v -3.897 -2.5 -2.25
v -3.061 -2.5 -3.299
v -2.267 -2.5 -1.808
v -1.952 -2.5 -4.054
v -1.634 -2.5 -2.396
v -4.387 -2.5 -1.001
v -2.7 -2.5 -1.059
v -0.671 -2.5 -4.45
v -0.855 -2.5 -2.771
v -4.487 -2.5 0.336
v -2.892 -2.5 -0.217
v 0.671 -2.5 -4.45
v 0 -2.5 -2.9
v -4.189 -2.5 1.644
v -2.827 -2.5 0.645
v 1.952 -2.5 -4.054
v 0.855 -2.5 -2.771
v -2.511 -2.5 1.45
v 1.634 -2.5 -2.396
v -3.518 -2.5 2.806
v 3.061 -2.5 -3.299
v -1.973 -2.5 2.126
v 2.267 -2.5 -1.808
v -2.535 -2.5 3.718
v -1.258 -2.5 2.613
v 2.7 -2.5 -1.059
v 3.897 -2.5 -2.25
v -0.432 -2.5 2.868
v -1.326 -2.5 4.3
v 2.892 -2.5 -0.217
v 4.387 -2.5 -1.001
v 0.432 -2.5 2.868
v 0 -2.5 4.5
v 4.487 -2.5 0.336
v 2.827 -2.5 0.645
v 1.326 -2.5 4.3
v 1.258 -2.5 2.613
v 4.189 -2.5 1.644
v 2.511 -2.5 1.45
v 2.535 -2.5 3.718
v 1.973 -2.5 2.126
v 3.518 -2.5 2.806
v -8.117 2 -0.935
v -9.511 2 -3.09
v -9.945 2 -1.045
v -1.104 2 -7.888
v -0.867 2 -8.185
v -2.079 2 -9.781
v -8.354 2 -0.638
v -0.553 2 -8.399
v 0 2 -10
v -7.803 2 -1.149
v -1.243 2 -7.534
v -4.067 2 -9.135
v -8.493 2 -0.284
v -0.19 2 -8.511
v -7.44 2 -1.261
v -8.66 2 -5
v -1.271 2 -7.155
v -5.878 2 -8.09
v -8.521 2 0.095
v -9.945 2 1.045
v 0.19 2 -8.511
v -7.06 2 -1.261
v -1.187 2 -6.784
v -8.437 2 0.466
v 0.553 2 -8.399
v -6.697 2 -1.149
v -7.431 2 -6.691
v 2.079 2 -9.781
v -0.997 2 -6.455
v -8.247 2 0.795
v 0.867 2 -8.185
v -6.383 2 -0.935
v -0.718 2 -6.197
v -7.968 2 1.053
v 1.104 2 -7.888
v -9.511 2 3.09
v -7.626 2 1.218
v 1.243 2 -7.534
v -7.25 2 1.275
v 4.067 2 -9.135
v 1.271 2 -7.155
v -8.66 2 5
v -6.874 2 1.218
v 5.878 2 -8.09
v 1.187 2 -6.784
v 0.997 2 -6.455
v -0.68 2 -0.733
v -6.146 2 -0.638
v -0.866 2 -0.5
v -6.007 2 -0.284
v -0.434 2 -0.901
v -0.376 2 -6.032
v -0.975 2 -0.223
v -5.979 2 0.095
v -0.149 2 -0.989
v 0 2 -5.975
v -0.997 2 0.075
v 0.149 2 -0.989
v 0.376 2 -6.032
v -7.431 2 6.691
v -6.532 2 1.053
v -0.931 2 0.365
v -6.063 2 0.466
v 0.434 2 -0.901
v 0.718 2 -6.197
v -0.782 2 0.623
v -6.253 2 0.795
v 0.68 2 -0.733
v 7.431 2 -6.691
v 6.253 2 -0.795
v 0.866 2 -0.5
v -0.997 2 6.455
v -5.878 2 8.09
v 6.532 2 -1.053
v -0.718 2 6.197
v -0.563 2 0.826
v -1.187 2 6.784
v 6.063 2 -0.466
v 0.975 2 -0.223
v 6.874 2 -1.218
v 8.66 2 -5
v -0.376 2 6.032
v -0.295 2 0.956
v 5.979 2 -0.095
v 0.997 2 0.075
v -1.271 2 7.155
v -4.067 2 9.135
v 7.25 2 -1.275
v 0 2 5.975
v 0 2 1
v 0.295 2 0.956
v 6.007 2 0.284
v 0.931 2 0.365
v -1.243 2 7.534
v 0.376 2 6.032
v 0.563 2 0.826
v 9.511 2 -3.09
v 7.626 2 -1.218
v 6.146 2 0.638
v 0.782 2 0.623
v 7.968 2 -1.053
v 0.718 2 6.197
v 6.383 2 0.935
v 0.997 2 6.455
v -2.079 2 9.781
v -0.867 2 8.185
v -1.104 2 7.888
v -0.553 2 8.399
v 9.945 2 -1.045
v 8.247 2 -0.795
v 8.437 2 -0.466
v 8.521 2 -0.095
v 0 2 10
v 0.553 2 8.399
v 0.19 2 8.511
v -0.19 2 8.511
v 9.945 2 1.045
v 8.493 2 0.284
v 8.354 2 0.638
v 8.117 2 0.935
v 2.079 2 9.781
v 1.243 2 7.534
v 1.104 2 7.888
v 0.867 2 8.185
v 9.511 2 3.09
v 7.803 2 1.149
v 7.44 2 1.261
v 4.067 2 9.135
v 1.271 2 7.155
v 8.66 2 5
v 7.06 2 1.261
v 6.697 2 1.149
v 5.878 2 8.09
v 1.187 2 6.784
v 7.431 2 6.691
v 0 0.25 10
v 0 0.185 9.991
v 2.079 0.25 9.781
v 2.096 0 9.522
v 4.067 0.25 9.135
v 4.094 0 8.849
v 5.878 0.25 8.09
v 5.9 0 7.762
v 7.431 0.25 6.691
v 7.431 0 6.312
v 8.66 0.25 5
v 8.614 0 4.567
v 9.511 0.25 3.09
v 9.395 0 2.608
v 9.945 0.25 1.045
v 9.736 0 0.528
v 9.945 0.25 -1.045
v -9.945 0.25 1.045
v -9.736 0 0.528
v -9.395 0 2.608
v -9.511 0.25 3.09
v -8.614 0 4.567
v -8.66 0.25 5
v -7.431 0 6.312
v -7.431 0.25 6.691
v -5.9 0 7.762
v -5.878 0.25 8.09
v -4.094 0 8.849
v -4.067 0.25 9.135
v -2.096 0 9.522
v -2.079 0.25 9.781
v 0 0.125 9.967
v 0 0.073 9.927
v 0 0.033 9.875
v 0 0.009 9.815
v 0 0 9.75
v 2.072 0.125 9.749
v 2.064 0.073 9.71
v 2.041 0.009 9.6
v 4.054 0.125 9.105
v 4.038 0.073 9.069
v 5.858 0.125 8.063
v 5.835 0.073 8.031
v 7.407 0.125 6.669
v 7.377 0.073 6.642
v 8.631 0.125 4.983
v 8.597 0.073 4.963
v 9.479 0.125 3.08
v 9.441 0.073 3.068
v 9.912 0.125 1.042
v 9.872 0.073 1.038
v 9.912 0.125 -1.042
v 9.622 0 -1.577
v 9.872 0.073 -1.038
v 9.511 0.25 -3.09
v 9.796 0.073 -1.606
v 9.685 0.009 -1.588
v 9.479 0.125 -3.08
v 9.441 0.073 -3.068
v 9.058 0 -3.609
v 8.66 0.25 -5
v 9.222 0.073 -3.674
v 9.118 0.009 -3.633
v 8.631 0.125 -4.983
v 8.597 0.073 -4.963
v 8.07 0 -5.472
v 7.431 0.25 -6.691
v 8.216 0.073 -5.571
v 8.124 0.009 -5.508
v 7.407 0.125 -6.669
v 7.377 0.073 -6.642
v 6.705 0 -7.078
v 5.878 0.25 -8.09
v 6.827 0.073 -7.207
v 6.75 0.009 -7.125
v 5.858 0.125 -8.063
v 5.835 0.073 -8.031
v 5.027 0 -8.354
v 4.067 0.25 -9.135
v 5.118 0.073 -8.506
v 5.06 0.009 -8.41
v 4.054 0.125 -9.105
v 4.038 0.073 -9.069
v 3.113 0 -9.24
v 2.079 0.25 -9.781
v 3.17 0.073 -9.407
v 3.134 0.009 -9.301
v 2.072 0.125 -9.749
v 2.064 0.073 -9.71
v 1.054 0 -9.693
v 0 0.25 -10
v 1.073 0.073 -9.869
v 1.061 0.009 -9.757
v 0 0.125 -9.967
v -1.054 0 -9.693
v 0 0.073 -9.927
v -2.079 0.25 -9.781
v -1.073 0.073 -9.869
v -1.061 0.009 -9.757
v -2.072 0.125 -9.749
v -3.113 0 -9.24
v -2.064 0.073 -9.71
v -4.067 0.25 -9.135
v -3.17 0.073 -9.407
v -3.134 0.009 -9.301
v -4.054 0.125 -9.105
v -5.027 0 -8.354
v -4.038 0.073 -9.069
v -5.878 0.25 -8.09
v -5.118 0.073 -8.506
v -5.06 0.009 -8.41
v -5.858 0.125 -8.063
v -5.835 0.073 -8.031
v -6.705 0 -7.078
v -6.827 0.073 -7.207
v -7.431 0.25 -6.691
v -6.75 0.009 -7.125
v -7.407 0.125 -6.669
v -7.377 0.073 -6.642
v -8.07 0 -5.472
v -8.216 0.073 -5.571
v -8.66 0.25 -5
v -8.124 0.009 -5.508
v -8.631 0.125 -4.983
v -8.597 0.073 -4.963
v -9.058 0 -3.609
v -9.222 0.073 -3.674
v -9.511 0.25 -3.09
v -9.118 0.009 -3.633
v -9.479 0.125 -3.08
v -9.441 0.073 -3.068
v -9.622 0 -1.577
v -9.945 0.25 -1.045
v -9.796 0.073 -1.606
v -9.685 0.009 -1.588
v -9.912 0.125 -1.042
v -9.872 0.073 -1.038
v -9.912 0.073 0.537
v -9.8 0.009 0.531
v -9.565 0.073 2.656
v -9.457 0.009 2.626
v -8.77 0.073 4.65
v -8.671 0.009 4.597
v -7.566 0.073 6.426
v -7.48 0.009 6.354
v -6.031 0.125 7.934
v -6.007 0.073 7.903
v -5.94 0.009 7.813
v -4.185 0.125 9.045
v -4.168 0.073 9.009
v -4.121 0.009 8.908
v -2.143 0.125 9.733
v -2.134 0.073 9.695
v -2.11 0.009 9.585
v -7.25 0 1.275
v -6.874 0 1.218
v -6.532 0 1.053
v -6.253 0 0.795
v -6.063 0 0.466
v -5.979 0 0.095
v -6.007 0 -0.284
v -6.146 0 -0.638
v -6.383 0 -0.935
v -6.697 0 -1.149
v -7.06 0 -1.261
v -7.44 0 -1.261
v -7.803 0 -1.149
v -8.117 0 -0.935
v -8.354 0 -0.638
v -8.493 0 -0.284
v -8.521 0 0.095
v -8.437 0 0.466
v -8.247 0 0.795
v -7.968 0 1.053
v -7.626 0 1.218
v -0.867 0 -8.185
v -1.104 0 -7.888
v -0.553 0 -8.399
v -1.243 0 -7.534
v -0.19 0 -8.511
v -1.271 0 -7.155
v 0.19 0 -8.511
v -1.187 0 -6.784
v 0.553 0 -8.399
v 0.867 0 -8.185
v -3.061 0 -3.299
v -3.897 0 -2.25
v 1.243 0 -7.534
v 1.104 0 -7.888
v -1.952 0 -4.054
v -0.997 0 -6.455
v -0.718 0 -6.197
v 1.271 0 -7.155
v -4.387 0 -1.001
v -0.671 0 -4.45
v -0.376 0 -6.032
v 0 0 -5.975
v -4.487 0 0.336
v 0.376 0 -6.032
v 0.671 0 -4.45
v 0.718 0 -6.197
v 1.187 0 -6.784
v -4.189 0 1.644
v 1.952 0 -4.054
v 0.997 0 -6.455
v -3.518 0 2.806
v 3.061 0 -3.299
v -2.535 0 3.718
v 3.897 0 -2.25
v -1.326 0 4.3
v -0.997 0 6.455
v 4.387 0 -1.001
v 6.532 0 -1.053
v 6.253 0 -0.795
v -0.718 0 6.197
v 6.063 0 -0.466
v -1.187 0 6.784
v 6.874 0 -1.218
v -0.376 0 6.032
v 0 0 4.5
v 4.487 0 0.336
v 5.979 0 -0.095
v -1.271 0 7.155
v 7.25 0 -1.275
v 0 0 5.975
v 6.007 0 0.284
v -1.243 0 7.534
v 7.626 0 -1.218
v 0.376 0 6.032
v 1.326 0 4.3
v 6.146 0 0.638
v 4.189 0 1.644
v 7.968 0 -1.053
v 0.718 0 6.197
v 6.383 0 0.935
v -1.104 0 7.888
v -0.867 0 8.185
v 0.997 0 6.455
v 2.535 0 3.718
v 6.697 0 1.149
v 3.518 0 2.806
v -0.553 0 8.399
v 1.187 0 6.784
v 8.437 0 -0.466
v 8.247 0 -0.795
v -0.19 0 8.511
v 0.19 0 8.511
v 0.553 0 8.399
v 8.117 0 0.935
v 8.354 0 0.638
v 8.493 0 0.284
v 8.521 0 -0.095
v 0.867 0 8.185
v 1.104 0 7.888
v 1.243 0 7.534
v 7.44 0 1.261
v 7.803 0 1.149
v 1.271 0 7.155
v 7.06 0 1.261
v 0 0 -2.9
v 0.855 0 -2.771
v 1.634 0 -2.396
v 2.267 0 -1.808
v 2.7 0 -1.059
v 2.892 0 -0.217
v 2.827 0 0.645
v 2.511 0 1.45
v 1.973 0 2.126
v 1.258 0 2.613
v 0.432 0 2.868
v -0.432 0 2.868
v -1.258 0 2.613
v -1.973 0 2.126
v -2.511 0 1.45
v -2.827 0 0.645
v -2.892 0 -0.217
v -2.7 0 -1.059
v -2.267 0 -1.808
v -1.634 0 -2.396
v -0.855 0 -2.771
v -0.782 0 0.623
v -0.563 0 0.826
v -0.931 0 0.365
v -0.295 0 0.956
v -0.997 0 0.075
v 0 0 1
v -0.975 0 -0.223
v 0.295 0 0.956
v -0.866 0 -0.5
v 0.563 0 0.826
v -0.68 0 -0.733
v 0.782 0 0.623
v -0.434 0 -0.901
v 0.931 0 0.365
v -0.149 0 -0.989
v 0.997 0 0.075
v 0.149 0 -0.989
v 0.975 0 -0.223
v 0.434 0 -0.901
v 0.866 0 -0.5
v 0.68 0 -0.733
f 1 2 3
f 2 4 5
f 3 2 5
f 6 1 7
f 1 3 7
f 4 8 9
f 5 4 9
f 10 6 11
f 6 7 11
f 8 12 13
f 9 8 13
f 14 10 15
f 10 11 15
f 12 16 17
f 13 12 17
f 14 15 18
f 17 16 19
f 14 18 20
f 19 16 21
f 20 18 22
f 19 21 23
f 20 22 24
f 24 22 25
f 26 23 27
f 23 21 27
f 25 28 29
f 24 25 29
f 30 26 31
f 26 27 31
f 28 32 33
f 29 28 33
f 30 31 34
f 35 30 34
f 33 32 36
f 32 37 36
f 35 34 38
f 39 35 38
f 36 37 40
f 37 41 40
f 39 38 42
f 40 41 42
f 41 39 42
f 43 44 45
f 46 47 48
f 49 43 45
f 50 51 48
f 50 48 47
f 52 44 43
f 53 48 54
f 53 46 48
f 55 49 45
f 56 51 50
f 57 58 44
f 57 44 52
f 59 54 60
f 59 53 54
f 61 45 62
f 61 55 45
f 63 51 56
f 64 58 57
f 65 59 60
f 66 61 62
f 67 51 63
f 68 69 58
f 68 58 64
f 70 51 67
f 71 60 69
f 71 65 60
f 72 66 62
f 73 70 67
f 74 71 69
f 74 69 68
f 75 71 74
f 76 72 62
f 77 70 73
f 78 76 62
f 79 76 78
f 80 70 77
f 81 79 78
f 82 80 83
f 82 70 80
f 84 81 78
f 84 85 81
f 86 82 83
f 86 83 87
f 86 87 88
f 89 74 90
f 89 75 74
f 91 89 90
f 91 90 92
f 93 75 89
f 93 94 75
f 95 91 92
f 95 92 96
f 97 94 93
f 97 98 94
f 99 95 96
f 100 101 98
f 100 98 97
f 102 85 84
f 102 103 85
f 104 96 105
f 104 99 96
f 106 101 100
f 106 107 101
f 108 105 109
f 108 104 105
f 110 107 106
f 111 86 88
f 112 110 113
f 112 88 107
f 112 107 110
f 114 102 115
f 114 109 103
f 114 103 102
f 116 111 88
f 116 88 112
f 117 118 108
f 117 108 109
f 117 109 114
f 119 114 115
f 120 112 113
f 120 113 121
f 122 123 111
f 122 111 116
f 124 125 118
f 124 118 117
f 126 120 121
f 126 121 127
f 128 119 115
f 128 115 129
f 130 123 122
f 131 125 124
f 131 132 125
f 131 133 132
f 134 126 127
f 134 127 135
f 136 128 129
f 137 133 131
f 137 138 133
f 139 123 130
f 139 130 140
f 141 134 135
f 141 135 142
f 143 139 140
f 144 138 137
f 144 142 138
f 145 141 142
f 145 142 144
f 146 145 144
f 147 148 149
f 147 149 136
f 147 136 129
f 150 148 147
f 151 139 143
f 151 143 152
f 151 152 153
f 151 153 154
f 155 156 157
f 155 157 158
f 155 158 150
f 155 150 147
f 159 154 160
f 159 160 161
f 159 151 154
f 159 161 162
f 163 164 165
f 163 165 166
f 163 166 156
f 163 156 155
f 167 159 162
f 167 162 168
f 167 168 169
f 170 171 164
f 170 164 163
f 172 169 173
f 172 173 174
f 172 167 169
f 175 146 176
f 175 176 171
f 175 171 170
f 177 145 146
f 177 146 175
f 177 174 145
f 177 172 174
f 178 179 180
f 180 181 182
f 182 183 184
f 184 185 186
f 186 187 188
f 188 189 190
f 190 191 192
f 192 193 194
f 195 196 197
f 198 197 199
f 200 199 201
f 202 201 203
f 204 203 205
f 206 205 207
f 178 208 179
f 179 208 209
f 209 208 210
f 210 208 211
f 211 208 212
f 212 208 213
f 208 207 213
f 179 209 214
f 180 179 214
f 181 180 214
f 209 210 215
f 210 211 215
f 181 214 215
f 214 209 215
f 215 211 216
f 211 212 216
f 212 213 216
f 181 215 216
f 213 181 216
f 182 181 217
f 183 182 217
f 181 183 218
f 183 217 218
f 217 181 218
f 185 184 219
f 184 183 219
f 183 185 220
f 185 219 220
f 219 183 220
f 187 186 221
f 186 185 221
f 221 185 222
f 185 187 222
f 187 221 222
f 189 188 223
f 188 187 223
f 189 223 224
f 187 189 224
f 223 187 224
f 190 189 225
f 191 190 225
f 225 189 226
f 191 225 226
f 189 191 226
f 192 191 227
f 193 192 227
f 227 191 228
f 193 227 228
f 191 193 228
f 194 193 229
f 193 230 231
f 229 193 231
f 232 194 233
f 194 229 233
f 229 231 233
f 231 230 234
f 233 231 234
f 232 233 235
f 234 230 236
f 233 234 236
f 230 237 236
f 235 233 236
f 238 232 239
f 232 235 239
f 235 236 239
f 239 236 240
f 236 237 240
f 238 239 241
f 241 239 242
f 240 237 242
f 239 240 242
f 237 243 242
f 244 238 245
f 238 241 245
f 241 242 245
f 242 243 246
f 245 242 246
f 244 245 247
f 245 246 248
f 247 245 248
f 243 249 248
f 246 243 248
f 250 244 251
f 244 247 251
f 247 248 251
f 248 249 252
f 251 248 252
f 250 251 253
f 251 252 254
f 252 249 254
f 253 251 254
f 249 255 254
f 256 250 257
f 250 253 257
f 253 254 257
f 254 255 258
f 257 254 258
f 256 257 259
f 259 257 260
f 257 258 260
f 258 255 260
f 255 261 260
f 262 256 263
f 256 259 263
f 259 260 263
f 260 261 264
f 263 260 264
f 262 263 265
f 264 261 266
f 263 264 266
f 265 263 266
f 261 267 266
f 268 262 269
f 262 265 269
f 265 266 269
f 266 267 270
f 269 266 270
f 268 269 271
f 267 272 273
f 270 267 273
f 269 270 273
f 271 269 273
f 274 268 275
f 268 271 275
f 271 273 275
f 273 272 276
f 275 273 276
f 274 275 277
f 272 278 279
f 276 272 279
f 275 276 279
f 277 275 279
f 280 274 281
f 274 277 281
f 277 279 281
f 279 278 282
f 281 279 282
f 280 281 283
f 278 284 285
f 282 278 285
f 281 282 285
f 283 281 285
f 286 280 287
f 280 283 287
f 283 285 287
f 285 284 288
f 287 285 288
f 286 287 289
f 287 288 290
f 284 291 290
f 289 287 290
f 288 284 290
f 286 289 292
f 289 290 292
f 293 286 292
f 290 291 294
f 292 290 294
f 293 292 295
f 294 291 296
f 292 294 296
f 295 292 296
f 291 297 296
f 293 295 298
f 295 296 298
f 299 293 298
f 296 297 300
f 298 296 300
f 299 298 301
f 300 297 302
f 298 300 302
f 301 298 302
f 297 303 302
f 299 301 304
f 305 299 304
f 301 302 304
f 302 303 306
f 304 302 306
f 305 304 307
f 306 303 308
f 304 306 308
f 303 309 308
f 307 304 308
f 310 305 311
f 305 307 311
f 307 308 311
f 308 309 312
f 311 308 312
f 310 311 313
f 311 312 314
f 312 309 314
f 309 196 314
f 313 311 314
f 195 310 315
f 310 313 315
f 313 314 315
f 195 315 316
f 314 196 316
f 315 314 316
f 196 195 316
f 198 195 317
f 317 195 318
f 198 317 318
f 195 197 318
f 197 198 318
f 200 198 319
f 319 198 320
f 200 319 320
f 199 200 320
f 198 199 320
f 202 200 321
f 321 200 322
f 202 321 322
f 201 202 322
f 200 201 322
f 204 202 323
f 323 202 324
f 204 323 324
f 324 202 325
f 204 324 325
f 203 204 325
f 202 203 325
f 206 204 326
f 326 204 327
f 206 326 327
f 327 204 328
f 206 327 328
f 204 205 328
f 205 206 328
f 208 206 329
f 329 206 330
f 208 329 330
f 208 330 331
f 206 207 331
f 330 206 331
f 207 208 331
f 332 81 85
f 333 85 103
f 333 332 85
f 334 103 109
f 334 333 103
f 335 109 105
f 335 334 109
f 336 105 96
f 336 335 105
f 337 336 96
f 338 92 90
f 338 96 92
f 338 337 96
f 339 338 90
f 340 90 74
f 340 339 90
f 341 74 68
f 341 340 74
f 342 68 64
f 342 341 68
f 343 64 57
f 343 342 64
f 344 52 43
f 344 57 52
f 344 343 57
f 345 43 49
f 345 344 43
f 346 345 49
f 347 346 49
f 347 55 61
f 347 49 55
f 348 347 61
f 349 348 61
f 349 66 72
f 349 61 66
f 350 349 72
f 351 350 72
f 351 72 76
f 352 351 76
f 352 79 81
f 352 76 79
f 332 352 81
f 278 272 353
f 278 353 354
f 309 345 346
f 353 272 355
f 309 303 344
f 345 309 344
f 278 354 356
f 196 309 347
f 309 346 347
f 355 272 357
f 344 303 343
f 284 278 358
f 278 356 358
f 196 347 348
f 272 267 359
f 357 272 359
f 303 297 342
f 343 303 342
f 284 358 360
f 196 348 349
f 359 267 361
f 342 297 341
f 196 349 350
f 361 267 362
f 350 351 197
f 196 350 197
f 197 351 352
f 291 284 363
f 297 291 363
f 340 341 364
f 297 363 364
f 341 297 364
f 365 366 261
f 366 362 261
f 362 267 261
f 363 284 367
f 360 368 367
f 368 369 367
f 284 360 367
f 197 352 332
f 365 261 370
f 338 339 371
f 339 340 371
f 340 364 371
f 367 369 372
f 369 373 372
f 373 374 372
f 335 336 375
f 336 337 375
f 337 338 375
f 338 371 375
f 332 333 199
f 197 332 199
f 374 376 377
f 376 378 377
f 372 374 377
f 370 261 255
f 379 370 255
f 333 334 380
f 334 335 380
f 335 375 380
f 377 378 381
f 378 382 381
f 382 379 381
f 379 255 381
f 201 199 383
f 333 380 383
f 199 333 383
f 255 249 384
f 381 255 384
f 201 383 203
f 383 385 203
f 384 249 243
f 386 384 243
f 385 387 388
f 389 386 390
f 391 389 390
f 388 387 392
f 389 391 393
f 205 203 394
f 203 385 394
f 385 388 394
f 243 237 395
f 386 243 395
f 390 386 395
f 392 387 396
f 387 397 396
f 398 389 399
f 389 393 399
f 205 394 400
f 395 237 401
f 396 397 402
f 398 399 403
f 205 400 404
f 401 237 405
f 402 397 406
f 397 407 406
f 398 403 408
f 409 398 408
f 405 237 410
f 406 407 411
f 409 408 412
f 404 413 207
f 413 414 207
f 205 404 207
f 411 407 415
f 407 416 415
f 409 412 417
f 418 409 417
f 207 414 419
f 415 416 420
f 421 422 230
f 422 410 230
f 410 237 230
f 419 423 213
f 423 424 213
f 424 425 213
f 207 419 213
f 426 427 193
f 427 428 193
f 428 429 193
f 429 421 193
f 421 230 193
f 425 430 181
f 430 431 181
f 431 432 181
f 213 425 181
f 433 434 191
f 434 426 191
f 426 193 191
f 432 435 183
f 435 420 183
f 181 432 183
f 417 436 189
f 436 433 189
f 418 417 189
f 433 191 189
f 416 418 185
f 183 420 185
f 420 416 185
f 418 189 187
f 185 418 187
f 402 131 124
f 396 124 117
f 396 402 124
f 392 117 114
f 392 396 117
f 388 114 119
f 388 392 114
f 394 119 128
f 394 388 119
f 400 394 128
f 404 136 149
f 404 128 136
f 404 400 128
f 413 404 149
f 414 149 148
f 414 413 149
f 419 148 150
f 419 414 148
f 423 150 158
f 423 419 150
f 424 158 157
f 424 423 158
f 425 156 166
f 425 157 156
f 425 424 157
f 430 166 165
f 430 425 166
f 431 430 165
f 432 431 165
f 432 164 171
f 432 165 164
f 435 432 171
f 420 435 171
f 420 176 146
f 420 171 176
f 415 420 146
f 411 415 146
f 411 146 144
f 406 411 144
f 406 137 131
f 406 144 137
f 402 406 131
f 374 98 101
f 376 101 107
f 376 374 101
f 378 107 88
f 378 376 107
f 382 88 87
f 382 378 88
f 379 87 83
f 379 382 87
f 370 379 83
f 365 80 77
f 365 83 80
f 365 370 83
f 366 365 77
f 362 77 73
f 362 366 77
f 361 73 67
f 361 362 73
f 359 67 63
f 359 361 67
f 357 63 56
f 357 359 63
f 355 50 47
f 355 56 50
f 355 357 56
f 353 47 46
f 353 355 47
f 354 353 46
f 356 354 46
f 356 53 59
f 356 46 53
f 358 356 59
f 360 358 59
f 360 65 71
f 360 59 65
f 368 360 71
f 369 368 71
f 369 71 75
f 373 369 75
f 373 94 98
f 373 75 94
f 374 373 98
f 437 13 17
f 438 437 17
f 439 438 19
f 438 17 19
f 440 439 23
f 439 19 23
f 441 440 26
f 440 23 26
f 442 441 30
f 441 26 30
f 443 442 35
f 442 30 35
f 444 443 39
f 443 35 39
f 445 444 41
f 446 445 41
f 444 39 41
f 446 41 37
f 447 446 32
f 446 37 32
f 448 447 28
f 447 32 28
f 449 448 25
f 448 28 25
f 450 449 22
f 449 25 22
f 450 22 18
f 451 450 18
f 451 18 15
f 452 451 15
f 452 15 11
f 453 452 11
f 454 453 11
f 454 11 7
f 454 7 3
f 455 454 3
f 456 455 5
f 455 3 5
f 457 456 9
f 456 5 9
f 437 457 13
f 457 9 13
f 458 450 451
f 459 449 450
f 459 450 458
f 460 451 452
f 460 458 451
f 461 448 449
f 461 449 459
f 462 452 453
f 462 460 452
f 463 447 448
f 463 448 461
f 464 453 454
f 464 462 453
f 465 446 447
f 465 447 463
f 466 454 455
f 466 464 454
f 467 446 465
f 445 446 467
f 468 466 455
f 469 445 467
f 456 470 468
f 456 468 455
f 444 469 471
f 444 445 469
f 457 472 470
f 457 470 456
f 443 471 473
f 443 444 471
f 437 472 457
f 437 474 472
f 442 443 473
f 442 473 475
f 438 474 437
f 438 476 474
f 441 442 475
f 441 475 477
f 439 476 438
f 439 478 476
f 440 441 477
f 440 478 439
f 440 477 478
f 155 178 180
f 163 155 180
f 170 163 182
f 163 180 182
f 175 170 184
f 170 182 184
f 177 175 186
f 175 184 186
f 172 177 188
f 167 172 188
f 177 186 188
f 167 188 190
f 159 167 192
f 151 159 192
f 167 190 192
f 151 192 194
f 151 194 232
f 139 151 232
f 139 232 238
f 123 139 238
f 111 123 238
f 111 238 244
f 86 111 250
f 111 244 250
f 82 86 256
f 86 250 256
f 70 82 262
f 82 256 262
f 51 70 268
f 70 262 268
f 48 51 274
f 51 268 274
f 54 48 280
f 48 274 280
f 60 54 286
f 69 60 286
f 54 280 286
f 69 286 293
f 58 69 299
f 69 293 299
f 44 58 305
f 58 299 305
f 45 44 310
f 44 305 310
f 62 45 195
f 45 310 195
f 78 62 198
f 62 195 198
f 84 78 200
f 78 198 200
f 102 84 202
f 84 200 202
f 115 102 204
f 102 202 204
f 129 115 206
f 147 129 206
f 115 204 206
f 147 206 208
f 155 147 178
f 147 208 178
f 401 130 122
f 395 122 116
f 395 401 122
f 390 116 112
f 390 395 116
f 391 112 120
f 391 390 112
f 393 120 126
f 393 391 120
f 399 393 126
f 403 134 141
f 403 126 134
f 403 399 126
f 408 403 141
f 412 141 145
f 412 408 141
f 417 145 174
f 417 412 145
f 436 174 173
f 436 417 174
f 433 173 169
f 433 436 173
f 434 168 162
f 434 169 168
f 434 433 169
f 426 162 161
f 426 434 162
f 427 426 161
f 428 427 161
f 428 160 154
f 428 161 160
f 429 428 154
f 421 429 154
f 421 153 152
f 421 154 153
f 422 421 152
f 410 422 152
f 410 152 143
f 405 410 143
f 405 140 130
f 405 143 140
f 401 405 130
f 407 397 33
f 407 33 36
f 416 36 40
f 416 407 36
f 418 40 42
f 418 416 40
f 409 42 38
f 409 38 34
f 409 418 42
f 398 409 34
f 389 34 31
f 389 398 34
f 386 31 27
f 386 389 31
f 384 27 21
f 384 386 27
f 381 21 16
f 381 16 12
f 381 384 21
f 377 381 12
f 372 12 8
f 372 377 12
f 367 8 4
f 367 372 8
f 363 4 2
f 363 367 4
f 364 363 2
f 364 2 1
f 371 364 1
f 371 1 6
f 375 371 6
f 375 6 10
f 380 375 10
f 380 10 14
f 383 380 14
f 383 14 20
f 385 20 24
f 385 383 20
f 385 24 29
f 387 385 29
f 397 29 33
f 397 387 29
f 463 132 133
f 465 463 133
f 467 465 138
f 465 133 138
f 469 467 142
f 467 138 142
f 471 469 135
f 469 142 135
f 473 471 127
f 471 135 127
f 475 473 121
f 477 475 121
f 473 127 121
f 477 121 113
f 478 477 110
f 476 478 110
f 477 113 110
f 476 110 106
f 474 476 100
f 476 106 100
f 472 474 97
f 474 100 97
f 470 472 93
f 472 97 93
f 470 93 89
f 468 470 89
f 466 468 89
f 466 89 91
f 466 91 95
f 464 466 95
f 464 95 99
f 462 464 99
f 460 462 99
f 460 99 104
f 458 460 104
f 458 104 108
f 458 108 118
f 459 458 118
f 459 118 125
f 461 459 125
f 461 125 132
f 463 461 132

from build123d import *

# Parameters (mm, degrees)
SKETCH1_R           = 10
BOSS_EXTRUDE1_DEPTH = 2
SKETCH2_R           = 4.5
BOSS_EXTRUDE2_DEPTH = 2.5
SKETCH3_R           = 1.275
CUT_EXTRUDE1_DEPTH  = 15.361406616
FILLET1_R           = 0.25
SKETCH6_R           = 1
CUT_EXTRUDE2_DEPTH  = 15.840822214
SKETCH7_R           = 2.9
CUT_EXTRUDE3_DEPTH  = 2.5


with BuildPart() as part:
    # Sketch1 → Boss-Extrude1 (new body)
    with BuildSketch(Plane(origin=(0, 0, 0), x_dir=(1, 0, 0), z_dir=(0, 1, 0))):
        with Locations(Location((0, 0, 0), (0, 0, 270))):
            Circle(SKETCH1_R)
    extrude(amount=BOSS_EXTRUDE1_DEPTH)

    # Sketch2 → Boss-Extrude2 (add)
    with BuildSketch(Plane(origin=(0, 0, 0), x_dir=(1, 0, 0), z_dir=(0, 1, 0))):
        with Locations(Location((0, 0, 0), (0, 0, 270))):
            Circle(SKETCH2_R)
    extrude(amount=-BOSS_EXTRUDE2_DEPTH)

    # Sketch3 → Cut-Extrude1 (cut, through all)
    with BuildSketch(Plane(origin=(0, 0, 0), x_dir=(1, 0, 0), z_dir=(0, 1, 0))):
        with Locations(Location((0, 7.25, 0), (0, 0, 270))):
            Circle(SKETCH3_R)
        with Locations(Location((-7.25, 0, 0), (0, 0, 270))):
            Circle(SKETCH3_R)
        with Locations(Location((0, -7.25, 0), (0, 0, 90))):
            Circle(SKETCH3_R)
        with Locations(Location((7.25, 0, 0), (0, 0, 90))):
            Circle(SKETCH3_R)
    extrude(amount=CUT_EXTRUDE1_DEPTH, mode=Mode.SUBTRACT)

    # Fillet1
    fillet1_edges = [part.edges().sort_by_distance(p)[0] for p in [
        (0, 0, -10),
    ]]
    fillet(fillet1_edges, radius=FILLET1_R)

    # Sketch6 → Cut-Extrude2 (cut, through all)
    with BuildSketch(Plane(origin=(0, 2, 0), x_dir=(1, 0, 0), z_dir=(0, 1, 0))):
        with Locations(Location((0, 0, 0), (0, 0, 270))):
            Circle(SKETCH6_R)
    extrude(amount=-CUT_EXTRUDE2_DEPTH, mode=Mode.SUBTRACT)

    # Sketch7 → Cut-Extrude3 (cut)
    with BuildSketch(Plane.XZ.offset(2.5)):
        with Locations(Location((0, 0, 0), (0, 0, 270))):
            Circle(SKETCH7_R)
    extrude(amount=-CUT_EXTRUDE3_DEPTH, mode=Mode.SUBTRACT)


solid = part.part
